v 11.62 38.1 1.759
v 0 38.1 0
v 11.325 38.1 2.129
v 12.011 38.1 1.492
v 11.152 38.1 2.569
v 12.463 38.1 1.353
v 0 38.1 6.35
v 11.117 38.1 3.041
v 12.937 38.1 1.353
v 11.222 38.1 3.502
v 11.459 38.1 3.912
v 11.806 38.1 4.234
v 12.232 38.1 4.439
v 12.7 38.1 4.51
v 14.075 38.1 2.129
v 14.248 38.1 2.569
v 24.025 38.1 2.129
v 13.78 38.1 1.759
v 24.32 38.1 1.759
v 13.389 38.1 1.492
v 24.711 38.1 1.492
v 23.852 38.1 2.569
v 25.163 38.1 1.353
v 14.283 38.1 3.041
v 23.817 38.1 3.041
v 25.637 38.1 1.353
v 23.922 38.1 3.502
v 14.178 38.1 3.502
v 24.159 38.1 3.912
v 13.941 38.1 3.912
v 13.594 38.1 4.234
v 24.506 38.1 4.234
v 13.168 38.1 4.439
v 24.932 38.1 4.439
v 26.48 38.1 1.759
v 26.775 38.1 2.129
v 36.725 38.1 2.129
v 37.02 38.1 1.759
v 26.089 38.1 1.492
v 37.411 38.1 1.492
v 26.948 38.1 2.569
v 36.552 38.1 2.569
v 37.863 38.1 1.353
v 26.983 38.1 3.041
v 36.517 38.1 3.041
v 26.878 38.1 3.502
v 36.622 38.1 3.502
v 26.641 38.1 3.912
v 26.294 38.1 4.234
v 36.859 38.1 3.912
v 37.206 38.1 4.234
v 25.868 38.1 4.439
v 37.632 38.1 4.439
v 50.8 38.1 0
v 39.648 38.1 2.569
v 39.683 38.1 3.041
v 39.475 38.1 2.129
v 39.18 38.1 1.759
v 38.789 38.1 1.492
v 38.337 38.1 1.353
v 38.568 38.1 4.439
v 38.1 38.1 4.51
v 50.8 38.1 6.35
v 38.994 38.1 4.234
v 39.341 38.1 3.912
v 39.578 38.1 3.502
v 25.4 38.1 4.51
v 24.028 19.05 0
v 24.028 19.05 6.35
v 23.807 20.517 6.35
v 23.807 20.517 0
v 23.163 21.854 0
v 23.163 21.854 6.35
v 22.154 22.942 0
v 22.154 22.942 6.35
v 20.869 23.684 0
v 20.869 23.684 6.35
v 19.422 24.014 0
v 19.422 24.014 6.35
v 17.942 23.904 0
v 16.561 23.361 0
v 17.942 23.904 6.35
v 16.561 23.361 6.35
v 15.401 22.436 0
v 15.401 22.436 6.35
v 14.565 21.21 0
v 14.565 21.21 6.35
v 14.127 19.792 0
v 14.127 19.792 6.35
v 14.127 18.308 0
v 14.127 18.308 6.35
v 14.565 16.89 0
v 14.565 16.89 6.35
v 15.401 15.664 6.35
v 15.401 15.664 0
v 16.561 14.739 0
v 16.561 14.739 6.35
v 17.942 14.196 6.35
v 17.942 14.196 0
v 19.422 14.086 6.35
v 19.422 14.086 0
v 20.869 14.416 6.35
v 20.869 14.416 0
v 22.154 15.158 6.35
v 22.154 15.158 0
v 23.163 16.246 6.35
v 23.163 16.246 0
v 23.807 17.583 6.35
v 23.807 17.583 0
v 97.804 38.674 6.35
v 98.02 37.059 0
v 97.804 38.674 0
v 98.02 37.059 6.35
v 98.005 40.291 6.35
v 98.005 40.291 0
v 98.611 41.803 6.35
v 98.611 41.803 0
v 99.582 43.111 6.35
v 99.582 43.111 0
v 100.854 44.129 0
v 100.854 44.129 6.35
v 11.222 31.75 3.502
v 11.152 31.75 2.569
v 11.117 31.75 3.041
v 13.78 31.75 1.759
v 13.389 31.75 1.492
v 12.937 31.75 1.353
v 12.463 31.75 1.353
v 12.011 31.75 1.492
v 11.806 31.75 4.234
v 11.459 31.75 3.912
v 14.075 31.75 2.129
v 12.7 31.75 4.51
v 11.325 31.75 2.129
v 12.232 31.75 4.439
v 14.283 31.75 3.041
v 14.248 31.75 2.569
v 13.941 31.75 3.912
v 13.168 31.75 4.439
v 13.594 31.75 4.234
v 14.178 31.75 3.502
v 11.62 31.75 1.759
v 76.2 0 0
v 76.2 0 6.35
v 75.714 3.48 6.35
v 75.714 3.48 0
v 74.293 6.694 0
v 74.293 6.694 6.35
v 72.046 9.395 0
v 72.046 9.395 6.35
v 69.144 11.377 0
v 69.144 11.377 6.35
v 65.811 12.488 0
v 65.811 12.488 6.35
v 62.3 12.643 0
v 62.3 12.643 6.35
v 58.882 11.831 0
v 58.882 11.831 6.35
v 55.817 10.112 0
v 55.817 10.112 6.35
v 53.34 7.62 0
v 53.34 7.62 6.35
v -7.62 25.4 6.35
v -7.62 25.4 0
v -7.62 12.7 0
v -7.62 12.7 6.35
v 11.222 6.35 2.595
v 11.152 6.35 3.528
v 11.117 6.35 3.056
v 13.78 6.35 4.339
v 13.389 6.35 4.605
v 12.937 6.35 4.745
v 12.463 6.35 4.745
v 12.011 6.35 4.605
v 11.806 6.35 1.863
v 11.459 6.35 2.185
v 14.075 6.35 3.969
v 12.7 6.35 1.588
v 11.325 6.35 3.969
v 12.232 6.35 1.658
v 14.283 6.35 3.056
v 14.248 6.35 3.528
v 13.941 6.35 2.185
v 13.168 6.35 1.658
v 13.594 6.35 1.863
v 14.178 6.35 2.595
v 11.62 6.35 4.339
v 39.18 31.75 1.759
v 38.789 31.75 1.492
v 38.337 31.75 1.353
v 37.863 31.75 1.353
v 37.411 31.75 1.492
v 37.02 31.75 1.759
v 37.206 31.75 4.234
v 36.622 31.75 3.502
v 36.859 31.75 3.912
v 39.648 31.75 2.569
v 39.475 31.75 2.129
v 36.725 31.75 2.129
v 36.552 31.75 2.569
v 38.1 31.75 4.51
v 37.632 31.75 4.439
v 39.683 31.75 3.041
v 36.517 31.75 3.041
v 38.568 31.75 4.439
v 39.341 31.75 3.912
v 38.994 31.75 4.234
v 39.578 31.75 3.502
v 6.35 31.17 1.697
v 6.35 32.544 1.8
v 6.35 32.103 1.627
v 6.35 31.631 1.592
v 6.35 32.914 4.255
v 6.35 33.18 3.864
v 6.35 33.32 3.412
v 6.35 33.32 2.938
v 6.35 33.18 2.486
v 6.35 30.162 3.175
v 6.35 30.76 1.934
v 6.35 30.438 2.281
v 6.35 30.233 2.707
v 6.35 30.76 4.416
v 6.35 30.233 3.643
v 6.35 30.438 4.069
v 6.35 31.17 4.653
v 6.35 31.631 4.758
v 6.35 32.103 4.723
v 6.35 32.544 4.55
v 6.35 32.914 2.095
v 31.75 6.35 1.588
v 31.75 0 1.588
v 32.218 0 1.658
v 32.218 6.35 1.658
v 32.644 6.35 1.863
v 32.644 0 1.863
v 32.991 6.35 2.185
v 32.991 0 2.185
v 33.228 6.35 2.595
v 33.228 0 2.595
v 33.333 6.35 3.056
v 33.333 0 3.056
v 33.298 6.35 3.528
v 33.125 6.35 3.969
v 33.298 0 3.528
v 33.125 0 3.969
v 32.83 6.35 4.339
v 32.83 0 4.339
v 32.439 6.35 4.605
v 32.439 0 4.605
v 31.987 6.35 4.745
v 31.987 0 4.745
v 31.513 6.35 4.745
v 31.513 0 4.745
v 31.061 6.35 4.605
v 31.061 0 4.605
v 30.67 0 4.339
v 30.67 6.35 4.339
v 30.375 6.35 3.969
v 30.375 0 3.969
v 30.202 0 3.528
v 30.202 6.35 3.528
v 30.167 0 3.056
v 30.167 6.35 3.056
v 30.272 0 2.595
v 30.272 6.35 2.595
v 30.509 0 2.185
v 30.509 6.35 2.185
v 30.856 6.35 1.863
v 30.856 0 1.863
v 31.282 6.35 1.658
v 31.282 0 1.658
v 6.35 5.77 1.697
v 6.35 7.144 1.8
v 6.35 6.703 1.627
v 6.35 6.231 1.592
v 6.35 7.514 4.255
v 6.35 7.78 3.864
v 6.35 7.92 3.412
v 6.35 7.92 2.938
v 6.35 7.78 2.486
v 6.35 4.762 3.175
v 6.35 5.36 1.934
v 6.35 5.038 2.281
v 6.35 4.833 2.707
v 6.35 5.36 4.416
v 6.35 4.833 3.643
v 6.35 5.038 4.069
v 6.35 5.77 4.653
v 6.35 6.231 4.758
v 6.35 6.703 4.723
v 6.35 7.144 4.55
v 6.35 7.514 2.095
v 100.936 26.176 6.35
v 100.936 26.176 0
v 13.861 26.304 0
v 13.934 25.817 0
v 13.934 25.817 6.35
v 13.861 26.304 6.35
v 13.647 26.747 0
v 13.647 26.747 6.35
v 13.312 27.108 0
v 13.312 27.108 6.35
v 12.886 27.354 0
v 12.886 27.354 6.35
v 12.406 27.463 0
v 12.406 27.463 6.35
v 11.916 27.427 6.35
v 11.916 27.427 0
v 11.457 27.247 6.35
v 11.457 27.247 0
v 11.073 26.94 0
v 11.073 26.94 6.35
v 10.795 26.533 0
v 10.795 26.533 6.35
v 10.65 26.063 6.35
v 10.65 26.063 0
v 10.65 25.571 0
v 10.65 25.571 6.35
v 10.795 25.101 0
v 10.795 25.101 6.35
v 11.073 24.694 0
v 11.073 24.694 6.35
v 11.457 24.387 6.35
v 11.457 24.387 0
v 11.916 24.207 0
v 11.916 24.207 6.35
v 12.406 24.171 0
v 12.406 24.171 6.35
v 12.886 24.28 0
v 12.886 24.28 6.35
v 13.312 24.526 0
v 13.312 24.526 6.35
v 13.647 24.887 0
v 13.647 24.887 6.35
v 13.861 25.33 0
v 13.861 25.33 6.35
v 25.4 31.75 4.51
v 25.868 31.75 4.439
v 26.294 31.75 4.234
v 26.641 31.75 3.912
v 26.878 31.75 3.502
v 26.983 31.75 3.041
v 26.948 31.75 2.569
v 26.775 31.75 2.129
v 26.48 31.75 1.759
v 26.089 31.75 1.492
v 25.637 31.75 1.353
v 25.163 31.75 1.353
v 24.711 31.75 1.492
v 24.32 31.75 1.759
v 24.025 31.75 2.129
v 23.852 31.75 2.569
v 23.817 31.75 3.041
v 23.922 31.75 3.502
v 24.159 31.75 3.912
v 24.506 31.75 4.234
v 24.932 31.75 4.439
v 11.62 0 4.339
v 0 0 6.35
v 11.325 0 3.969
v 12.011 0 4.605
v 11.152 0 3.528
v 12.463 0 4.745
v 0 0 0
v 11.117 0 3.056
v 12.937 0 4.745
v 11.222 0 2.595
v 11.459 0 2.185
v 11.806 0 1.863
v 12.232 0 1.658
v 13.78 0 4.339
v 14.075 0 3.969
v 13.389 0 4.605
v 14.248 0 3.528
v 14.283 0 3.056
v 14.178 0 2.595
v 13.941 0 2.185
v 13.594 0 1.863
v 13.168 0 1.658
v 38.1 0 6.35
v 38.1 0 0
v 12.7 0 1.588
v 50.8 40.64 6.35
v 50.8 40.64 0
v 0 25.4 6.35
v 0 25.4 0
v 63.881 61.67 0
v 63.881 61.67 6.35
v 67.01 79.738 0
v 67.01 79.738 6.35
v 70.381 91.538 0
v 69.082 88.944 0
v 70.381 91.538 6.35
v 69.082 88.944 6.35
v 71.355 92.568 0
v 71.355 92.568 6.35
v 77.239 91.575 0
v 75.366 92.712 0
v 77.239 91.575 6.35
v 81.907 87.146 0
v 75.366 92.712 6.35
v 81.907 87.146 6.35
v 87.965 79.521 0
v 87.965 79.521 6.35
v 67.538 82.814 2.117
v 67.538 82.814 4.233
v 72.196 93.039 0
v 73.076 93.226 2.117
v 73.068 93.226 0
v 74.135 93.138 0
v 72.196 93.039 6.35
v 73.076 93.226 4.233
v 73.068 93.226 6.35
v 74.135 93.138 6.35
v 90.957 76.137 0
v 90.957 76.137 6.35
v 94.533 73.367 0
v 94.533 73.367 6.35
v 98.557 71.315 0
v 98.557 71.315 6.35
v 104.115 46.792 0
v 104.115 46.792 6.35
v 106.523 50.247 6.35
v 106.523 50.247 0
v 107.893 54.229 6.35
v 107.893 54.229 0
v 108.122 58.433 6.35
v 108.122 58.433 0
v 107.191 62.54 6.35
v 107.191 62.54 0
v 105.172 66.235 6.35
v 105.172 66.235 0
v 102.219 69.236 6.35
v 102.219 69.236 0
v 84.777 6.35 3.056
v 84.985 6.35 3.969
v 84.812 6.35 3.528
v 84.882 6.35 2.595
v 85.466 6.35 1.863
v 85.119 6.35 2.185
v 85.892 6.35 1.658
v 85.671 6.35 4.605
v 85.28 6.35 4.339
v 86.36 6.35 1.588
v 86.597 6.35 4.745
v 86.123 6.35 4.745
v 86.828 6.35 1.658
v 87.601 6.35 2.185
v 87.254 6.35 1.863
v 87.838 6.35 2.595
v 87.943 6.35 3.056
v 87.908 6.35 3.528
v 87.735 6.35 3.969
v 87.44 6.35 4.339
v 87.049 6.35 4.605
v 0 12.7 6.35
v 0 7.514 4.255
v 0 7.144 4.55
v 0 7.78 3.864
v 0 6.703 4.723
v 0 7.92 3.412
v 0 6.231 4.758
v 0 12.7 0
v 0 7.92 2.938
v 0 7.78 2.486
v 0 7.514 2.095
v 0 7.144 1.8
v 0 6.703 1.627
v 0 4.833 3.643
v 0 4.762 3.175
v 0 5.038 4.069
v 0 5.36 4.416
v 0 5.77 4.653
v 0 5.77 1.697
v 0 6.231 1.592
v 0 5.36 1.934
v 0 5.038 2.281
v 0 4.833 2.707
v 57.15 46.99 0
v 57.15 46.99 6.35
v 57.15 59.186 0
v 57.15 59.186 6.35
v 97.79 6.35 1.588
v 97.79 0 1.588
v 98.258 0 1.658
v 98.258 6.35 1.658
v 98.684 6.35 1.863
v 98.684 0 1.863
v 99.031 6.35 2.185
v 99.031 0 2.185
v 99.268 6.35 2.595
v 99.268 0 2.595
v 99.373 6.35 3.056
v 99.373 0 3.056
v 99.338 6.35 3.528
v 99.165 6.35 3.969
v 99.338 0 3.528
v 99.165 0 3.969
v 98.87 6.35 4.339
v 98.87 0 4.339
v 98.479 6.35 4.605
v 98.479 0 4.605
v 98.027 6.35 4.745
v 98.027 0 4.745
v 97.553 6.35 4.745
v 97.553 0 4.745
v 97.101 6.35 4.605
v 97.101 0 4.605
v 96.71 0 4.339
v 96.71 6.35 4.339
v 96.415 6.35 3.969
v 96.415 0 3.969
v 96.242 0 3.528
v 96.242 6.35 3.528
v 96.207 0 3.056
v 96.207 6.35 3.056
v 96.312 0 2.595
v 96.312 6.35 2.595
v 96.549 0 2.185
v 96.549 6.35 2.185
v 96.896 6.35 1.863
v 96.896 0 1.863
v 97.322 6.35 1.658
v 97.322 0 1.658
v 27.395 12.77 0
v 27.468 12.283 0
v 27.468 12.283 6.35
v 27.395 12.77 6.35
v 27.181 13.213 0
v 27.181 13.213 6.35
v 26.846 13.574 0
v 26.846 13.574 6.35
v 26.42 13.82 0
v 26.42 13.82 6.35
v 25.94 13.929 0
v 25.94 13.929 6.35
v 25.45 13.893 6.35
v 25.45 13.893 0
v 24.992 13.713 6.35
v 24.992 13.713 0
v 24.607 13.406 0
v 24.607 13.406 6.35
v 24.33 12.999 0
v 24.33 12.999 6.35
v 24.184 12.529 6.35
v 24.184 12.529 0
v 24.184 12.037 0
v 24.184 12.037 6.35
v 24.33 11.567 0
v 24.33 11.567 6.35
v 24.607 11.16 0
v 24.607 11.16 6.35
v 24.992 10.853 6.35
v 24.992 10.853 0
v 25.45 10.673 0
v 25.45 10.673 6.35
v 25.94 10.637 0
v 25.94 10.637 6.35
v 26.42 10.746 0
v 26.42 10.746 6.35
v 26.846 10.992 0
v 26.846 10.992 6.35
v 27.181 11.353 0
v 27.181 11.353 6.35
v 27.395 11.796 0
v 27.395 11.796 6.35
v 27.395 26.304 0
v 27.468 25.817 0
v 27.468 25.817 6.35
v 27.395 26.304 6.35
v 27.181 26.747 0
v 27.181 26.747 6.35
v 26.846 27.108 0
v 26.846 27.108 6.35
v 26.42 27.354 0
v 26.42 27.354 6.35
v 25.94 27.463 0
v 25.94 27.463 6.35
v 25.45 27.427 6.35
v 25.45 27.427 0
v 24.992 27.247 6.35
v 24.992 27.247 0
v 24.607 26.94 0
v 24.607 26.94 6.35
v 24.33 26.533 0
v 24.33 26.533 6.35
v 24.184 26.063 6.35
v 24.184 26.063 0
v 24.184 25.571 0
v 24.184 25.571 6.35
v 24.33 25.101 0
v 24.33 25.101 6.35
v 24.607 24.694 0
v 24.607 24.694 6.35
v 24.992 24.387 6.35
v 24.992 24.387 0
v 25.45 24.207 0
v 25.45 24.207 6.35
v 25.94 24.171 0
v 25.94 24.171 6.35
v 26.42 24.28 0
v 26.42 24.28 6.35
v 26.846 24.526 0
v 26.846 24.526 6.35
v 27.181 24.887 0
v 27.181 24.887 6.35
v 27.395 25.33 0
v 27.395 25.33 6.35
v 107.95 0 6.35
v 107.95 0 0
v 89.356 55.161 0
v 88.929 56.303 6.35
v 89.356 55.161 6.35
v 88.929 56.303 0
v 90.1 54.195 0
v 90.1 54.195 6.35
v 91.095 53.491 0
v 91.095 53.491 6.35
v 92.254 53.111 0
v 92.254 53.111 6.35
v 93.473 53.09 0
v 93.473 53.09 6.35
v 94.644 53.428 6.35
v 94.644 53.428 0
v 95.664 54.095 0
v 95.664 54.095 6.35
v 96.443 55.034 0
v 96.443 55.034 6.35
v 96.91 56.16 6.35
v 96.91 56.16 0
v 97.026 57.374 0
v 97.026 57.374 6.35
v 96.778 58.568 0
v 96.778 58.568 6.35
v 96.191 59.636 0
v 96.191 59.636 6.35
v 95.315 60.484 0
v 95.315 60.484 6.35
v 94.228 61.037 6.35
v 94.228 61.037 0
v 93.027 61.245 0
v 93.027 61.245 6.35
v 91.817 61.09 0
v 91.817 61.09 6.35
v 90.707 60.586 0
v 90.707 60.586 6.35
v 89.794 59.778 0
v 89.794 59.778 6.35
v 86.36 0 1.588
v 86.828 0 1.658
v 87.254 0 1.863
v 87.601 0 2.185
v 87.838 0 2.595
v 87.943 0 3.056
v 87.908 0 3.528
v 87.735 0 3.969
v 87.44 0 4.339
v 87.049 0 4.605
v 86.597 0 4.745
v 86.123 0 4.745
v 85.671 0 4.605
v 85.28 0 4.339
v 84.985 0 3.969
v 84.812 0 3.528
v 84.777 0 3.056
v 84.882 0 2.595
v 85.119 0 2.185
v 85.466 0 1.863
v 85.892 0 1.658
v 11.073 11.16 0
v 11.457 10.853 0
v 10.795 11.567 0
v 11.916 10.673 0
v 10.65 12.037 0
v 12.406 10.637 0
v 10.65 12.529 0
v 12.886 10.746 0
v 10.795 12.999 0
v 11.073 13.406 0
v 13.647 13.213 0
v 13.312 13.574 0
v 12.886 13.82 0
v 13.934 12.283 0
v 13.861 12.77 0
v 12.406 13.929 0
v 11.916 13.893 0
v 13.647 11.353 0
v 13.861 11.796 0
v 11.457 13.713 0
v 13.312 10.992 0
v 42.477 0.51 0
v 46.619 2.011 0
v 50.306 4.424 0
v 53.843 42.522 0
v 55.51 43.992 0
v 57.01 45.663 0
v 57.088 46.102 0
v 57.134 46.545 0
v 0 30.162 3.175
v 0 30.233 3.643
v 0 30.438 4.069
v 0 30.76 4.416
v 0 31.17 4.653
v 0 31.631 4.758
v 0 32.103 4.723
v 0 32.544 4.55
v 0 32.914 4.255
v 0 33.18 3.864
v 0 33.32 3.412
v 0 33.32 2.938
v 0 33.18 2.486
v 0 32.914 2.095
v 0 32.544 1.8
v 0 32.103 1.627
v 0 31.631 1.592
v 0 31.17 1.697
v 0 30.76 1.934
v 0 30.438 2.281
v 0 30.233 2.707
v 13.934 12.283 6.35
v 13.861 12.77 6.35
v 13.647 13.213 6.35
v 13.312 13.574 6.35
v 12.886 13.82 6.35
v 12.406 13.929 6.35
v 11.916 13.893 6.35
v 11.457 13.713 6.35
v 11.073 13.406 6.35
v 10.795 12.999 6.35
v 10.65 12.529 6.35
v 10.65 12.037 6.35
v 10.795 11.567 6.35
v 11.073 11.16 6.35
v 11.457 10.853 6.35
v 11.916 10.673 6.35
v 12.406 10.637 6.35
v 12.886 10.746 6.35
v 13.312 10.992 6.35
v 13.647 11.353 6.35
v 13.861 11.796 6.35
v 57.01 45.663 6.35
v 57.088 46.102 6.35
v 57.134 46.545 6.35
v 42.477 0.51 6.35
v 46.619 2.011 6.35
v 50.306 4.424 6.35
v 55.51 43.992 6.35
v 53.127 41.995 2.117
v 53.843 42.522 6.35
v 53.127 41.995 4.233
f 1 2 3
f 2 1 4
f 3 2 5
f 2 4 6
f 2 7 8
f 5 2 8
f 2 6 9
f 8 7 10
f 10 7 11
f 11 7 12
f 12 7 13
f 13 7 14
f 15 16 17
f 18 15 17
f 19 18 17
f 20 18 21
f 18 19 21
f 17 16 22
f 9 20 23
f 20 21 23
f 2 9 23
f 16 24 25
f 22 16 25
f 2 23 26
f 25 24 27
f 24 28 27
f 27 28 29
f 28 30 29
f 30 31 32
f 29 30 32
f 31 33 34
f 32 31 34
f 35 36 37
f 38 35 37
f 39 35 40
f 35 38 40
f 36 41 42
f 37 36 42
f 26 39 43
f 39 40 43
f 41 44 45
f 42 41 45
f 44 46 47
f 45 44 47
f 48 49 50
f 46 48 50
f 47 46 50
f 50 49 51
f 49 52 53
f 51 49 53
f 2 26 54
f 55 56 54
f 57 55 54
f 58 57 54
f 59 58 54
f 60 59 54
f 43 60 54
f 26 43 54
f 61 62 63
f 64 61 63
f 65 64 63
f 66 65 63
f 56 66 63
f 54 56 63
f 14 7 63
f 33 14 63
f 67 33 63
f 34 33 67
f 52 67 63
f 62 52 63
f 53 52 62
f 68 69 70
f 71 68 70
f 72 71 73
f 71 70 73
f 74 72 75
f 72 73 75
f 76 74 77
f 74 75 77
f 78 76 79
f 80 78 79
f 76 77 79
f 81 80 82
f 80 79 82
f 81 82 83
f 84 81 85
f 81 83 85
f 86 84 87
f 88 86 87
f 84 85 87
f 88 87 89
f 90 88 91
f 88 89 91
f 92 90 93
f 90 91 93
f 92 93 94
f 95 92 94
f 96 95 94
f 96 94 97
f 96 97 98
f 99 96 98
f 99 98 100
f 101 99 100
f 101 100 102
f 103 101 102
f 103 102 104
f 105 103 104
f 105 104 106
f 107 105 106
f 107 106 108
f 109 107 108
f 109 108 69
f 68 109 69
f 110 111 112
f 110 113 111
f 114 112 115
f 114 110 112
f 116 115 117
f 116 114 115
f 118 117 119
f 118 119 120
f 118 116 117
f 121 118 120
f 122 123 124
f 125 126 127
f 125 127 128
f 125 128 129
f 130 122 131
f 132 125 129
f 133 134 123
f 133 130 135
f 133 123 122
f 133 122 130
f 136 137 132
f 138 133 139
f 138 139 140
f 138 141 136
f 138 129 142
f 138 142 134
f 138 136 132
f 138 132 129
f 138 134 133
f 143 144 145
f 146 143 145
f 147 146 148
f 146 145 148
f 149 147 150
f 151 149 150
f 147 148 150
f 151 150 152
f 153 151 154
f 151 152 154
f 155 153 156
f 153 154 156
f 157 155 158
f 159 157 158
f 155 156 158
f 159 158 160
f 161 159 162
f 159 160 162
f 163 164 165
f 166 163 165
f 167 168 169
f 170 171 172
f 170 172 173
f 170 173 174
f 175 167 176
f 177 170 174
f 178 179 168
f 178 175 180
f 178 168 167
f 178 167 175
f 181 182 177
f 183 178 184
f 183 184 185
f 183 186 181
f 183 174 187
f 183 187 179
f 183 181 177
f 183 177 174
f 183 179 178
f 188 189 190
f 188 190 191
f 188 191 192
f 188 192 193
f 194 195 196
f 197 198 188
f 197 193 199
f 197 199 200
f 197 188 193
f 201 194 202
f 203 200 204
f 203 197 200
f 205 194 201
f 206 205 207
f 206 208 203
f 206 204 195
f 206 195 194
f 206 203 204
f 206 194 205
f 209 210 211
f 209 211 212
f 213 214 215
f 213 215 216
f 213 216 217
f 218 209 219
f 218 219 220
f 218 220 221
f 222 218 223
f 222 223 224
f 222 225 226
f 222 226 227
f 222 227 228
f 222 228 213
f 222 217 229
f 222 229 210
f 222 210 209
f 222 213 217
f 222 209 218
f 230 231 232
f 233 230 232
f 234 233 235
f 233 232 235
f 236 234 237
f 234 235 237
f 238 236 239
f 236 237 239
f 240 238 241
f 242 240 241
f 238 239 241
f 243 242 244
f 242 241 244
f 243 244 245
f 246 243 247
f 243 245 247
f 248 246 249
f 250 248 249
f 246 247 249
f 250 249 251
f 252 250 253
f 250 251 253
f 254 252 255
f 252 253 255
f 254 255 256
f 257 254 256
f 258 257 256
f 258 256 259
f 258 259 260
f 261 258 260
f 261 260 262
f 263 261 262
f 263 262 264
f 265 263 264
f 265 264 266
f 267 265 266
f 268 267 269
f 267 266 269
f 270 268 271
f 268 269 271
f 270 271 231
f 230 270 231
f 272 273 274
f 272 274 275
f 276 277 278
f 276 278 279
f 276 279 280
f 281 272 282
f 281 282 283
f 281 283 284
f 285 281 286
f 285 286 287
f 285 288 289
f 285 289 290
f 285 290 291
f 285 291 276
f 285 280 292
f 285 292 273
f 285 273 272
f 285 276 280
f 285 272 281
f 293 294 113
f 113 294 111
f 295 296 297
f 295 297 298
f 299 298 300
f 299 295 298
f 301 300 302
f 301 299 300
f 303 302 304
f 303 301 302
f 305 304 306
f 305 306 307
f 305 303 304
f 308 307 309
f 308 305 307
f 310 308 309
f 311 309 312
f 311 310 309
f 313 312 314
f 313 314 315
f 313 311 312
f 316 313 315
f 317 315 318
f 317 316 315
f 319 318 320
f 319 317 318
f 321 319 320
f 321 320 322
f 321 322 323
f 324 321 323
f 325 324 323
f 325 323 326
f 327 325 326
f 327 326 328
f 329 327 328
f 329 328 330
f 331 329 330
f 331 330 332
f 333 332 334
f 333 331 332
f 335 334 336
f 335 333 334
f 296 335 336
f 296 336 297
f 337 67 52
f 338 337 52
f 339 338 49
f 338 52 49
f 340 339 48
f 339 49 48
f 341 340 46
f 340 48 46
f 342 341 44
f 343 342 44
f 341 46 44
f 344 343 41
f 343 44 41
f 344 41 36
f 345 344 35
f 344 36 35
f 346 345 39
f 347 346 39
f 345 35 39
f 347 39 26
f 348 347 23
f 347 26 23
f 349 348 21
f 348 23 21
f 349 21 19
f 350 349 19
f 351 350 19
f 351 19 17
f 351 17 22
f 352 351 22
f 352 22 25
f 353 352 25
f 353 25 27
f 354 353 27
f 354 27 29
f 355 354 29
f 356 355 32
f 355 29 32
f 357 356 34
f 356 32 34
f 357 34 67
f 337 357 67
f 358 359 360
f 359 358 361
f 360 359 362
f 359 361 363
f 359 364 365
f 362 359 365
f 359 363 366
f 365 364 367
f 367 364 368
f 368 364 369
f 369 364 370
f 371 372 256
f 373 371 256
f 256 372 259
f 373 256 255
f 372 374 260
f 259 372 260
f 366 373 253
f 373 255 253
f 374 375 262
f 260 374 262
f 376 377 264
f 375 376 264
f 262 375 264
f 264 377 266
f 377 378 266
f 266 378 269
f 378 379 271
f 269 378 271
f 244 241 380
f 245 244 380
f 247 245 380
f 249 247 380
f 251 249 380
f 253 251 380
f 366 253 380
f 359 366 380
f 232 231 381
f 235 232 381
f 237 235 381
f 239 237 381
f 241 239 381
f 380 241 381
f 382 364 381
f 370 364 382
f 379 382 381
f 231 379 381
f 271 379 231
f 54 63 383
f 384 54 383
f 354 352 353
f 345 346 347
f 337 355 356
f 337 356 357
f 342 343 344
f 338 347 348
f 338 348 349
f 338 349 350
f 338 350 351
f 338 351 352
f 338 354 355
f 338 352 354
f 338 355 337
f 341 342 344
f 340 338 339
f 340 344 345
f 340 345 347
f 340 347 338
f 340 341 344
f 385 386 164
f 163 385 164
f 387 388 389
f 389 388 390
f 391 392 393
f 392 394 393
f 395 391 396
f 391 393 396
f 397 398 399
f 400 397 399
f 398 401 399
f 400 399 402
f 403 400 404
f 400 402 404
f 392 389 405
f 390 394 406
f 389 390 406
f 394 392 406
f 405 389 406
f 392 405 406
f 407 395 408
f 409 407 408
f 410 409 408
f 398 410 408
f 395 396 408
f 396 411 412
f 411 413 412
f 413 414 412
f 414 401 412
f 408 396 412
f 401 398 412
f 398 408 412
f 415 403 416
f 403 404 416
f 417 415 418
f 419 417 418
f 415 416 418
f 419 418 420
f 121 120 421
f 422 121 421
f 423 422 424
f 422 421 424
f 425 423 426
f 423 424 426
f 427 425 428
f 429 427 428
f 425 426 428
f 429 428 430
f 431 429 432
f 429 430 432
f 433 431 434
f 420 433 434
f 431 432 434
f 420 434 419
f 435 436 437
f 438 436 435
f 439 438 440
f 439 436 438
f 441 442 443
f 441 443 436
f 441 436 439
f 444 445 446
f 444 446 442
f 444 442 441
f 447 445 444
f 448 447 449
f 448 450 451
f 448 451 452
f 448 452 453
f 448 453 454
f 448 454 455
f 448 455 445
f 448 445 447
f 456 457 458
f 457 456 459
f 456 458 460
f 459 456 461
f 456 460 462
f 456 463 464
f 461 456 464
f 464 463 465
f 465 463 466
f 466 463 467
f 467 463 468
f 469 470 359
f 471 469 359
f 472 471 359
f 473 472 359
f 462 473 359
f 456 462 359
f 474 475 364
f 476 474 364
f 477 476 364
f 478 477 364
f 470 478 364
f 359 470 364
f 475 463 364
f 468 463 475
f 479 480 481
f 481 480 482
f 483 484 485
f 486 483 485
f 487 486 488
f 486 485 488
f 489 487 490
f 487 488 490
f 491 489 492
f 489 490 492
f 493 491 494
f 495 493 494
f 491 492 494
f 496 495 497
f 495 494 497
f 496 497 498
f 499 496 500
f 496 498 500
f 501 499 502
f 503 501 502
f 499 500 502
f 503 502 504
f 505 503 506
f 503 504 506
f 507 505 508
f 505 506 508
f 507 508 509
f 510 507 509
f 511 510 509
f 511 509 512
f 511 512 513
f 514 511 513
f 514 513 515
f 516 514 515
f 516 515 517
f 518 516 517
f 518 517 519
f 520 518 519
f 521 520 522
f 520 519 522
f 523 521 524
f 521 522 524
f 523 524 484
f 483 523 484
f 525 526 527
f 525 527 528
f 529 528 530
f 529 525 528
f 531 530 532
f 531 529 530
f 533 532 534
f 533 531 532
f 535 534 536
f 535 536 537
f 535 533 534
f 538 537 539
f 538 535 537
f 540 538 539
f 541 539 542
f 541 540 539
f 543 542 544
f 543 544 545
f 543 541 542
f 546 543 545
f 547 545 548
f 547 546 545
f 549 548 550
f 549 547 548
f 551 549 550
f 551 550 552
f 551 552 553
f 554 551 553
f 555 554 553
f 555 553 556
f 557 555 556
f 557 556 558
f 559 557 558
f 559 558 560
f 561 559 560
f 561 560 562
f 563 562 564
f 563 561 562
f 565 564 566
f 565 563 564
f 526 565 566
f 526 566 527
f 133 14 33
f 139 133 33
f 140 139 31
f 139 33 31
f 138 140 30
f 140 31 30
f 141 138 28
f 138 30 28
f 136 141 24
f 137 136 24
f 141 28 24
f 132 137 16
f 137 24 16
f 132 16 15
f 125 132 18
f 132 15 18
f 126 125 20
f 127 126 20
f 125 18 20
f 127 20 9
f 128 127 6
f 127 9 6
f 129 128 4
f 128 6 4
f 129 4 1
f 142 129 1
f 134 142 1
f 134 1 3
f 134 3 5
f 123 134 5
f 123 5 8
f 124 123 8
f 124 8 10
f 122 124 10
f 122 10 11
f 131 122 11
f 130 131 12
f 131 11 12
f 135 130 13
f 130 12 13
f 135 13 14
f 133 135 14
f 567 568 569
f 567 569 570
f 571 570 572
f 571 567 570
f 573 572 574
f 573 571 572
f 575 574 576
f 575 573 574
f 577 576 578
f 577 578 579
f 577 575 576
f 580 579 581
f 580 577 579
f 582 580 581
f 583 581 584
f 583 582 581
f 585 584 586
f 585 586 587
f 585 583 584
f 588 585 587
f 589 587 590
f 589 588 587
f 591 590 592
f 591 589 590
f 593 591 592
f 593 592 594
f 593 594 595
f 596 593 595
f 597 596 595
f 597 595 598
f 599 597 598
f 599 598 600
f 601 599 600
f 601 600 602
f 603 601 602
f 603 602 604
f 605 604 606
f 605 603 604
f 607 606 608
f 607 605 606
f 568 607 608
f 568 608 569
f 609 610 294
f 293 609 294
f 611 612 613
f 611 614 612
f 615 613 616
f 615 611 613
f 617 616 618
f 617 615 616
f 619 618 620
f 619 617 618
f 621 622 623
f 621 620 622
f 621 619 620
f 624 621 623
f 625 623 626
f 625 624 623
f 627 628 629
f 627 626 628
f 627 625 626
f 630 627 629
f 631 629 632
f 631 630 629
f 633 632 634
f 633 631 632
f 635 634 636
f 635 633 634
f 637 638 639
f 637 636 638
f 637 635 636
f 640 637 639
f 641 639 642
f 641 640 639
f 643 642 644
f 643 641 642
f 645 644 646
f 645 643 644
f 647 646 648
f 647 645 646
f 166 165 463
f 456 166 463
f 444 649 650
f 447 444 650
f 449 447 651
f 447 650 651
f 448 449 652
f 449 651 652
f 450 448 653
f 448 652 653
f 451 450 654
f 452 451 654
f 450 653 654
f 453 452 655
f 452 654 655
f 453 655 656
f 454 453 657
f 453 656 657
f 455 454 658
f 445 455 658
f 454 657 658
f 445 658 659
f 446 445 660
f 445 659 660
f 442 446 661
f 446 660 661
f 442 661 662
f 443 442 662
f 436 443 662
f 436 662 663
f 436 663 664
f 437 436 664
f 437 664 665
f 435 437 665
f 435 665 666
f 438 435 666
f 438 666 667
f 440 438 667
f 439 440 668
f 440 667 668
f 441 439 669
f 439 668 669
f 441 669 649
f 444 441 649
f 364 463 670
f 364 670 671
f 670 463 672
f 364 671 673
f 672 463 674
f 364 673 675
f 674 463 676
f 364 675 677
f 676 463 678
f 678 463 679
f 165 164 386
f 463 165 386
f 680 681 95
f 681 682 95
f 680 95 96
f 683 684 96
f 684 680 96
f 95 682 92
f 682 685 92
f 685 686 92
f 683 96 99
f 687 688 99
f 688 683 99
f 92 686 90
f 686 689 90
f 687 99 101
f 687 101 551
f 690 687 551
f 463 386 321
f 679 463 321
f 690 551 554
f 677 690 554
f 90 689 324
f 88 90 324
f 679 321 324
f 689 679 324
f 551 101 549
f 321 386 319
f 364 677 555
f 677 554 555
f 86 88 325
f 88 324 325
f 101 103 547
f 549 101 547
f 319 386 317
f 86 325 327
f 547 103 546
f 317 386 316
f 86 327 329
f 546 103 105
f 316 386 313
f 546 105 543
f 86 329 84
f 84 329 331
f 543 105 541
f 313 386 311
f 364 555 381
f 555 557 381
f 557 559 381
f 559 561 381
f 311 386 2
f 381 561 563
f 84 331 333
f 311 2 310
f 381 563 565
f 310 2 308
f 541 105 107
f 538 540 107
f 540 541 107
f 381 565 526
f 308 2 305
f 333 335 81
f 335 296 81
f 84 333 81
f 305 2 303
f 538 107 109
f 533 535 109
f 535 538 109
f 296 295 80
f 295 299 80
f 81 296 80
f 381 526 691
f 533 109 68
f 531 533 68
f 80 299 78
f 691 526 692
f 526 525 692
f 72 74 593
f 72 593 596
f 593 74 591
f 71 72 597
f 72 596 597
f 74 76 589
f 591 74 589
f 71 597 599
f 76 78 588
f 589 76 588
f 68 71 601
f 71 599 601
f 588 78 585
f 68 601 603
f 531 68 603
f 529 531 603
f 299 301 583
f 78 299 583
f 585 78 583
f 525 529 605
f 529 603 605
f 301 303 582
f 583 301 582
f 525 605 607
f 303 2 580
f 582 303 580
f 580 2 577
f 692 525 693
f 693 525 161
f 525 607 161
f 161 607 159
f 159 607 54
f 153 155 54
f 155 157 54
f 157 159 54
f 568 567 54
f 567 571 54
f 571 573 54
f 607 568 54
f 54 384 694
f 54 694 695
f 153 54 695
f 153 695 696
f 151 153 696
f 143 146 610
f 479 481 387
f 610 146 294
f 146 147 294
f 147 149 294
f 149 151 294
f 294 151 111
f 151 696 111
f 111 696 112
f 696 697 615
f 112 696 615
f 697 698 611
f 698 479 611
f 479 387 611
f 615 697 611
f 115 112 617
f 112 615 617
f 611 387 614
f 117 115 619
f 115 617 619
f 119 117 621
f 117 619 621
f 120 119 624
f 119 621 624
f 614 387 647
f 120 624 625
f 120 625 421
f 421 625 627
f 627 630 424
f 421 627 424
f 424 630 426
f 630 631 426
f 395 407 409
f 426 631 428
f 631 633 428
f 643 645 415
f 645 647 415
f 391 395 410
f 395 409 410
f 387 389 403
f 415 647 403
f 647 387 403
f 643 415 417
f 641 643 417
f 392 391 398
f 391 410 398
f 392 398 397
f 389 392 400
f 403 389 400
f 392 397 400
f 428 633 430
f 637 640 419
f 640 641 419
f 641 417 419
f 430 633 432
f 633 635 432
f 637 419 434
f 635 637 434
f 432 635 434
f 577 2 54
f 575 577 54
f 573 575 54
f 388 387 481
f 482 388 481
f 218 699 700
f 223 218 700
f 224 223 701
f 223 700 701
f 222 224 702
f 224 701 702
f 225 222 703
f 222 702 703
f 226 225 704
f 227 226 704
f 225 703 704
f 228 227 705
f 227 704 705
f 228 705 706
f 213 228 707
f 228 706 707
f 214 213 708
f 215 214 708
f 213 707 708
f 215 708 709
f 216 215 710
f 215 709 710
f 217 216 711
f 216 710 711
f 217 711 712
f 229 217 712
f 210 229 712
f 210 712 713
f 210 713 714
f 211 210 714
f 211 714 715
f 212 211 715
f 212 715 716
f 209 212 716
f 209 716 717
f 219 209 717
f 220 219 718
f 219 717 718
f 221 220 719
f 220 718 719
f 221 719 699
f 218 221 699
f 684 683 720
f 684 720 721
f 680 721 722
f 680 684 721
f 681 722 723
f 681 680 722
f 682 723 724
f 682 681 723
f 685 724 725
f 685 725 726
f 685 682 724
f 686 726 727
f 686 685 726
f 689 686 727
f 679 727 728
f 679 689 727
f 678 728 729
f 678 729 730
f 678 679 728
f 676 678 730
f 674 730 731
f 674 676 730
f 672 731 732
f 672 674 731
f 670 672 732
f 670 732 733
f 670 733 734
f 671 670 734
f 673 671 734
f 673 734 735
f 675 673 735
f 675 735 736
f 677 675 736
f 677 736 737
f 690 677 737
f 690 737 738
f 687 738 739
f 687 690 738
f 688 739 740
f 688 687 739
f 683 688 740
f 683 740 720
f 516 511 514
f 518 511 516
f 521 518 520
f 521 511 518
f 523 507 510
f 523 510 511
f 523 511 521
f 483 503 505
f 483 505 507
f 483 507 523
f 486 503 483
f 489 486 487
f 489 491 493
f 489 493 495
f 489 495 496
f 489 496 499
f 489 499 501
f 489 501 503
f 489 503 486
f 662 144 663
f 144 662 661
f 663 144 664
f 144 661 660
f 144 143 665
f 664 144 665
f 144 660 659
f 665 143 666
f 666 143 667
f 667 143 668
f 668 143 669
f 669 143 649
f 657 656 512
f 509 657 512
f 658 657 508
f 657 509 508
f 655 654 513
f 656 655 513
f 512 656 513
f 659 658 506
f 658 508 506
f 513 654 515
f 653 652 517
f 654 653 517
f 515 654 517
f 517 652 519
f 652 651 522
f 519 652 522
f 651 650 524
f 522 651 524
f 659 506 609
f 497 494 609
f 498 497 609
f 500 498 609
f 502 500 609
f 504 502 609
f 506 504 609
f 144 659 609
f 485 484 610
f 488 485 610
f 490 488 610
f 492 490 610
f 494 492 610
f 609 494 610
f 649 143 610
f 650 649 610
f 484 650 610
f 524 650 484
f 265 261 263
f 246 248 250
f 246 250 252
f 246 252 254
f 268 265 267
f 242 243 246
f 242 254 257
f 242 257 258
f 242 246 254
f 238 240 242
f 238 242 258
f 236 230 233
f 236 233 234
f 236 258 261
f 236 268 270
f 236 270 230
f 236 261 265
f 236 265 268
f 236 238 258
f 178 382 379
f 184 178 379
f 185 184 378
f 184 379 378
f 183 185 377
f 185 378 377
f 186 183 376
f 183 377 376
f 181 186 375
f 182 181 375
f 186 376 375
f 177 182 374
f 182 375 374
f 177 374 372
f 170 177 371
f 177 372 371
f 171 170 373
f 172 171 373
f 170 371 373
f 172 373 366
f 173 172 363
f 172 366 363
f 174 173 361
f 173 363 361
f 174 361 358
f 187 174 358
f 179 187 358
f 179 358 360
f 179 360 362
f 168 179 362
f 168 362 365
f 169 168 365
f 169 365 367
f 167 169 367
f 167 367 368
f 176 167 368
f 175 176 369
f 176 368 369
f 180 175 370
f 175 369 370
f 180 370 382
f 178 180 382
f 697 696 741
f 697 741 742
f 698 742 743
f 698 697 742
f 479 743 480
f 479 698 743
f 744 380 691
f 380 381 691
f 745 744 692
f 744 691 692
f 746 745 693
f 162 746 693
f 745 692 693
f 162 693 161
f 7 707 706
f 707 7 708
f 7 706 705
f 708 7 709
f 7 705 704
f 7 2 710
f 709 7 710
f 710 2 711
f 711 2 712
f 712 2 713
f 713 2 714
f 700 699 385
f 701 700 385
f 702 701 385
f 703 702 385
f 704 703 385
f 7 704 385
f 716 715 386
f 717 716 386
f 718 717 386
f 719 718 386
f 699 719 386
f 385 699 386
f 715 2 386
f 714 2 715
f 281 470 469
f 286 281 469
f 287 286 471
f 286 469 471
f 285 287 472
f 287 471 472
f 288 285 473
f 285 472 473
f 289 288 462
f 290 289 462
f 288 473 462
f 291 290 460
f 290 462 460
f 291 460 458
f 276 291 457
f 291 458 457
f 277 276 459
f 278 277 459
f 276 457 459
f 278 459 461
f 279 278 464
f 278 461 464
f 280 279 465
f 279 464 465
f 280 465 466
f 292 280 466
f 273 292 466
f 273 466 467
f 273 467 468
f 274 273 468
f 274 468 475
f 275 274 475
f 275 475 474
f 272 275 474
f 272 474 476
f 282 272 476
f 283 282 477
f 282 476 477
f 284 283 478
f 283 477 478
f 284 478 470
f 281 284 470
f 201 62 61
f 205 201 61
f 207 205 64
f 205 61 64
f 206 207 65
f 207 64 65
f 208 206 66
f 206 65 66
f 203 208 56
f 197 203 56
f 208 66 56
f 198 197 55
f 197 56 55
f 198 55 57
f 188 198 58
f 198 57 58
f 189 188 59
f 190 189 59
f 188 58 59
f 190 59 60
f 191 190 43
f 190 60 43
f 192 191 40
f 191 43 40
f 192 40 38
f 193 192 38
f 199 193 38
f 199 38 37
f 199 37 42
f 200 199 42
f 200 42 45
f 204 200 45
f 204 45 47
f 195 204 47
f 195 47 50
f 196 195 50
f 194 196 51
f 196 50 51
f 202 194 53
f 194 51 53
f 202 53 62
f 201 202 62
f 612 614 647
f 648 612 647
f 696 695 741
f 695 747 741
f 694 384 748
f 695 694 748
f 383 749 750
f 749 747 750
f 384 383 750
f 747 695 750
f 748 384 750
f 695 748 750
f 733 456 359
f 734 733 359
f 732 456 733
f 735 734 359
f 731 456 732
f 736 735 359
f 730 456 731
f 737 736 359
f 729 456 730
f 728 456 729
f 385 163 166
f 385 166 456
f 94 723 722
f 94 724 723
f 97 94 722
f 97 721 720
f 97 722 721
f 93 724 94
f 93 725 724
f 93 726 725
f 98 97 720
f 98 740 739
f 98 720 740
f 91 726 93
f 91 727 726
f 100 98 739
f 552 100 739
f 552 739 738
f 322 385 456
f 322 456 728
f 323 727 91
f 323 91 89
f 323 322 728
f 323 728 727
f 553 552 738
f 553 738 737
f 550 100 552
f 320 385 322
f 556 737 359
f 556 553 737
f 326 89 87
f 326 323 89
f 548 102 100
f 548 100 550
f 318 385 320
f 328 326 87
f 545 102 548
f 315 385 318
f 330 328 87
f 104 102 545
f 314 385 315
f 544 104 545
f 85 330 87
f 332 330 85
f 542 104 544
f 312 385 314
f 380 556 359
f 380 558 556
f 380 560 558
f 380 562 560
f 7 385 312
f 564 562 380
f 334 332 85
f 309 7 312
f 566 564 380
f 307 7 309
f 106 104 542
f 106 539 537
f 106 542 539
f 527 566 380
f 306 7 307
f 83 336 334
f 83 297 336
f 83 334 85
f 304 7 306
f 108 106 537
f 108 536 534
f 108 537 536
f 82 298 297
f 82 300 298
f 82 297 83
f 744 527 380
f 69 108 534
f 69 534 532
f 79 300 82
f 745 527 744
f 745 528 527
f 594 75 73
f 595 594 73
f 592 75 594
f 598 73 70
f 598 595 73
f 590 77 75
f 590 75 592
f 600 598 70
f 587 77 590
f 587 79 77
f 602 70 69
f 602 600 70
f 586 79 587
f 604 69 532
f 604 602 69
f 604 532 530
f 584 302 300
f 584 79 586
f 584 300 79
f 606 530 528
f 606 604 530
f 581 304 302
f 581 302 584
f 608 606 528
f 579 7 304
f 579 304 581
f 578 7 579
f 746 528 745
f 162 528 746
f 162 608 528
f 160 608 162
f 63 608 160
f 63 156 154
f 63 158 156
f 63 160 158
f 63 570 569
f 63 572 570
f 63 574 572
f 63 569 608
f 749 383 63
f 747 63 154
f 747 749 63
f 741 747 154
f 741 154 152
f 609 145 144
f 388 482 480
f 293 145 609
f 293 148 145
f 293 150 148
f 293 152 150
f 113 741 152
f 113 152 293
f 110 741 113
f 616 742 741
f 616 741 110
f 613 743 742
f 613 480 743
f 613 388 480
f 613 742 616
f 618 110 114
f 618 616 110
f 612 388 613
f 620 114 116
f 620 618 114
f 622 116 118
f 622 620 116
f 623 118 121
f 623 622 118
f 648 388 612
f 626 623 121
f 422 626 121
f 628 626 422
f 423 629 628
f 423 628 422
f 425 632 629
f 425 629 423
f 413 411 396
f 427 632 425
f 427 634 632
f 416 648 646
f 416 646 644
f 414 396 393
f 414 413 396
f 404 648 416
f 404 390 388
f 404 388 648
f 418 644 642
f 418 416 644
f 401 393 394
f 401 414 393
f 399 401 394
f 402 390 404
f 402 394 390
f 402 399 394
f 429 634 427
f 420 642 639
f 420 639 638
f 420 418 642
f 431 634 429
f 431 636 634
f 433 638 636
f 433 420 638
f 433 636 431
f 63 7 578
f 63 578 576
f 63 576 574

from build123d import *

# Parameters (mm, degrees)
SKETCH1_R           = 4.09575
SKETCH1_R_2         = 1.651
BOSS_EXTRUDE1_DEPTH = 6.35
SKETCH3_R           = 1.5875
CUT_EXTRUDE1_DEPTH  = 6.35
CUT_EXTRUDE2_DEPTH  = 6.35
SKETCH7_R           = 4.9784
CUT_EXTRUDE3_DEPTH  = 131.317526076
FILLET1_R           = 6.35
SKETCH8_W           = 50.8
SKETCH8_H           = 38.1
CUT_EXTRUDE4_DEPTH  = 50.8
CUT_EXTRUDE5_DEPTH  = 19.304
FILLET6_R           = 6.35
FILLET8_R           = 19.05
SKETCH10_R          = 1.5875
CUT_EXTRUDE6_DEPTH  = 6.35
SKETCH11_R          = 1.5875
CUT_EXTRUDE7_DEPTH  = 6.35
BOSS_EXTRUDE2_DEPTH = 6.35
FILLET9_R           = 24.13


with BuildPart() as part:
    # Sketch1 → Boss-Extrude1 (new body)
    with BuildSketch(Plane.XY):
        with BuildLine():
            Line((0, 0), (107.95, 0))
            Line((107.95, 0), (100.9362606, 26.175631792))
            Line((100.9362606, 26.175631792), (96.600438298, 42.357140917))
            ThreePointArc((96.600438298, 42.357140917), (108.063690957, 58.995863967), (92.935889192, 72.39))
            Line((92.935889192, 72.39), (0, 38.1))
            Line((0, 38.1), (0, 25.4))
            Line((0, 25.4), (-7.62, 25.4))
            Line((-7.62, 25.4), (-7.62, 12.7))
            Line((-7.62, 12.7), (0, 12.7))
            Line((0, 12.7), (0, 0))
        make_face()
        with Locations((92.935889192, 57.15)):
            Circle(SKETCH1_R, mode=Mode.SUBTRACT)
        with Locations((25.817011896, 25.817011896)):
            Circle(SKETCH1_R_2, mode=Mode.SUBTRACT)
        with Locations((25.817011896, 12.282988104)):
            Circle(SKETCH1_R_2, mode=Mode.SUBTRACT)
        with Locations((12.282988104, 12.282988104)):
            Circle(SKETCH1_R_2, mode=Mode.SUBTRACT)
        with Locations((12.282988104, 25.817011896)):
            Circle(SKETCH1_R_2, mode=Mode.SUBTRACT)
    extrude(amount=BOSS_EXTRUDE1_DEPTH)

    # Sketch3 → Cut-Extrude1 (cut)
    with BuildSketch(Plane.ZY):
        with Locations(Location((3.175, 31.75, 0), (0, 0, 270))):
            Circle(SKETCH3_R)
        with Locations(Location((3.175, 6.35, 0), (0, 0, 270))):
            Circle(SKETCH3_R)
    extrude(amount=-CUT_EXTRUDE1_DEPTH, mode=Mode.SUBTRACT)

    # Sketch6 → Cut-Extrude2 (cut)
    with BuildSketch(Plane.XY.offset(6.35)):
        with BuildLine():
            Line((50.8, 0), (76.2, 0))
            ThreePointArc((76.2, 0), (63.5, 12.7), (50.8, 0))
        make_face()
    extrude(amount=-CUT_EXTRUDE2_DEPTH, mode=Mode.SUBTRACT)

    # Sketch7 → Cut-Extrude3 (cut, through all)
    with BuildSketch(Plane.XY.offset(6.35)):
        with Locations((19.05, 19.05)):
            Circle(SKETCH7_R)
    extrude(amount=-CUT_EXTRUDE3_DEPTH, mode=Mode.SUBTRACT)

    # Fillet1
    fillet1_edges = [part.edges().sort_by_distance(p)[0] for p in [
        (96.600438298, 42.357140917, 3.175),
    ]]
    fillet(fillet1_edges, radius=FILLET1_R)

    # Sketch8 → Cut-Extrude4 (cut)
    with BuildSketch(Plane.XY.offset(6.35)):
        with Locations((25.4, 57.15)):
            Rectangle(SKETCH8_W, SKETCH8_H)
    extrude(amount=-CUT_EXTRUDE4_DEPTH, mode=Mode.SUBTRACT)

    # Sketch9 → Cut-Extrude5 (cut)
    with BuildSketch(Plane.XY.offset(6.35)):
        Polygon((50.8, 56.84337261), (50.8, 40.64), (57.15, 40.64), (57.15, 59.186294187), align=None)
    extrude(amount=-CUT_EXTRUDE5_DEPTH, mode=Mode.SUBTRACT)

    # Fillet6
    fillet6_edges = [part.edges().sort_by_distance(p)[0] for p in [
        (57.15, 40.64, 3.175),
    ]]
    fillet(fillet6_edges, radius=FILLET6_R - 0.0001)  # a hair under: the kernel refuses the full size

    # Fillet8
    fillet8_edges = [part.edges().sort_by_distance(p)[0] for p in [
        (50.8, 0, 3.175),
    ]]
    fillet(fillet8_edges, radius=FILLET8_R)

    # Sketch10 → Cut-Extrude6 (cut)
    with BuildSketch(Plane.XZ):
        with Locations(Location((97.79, 3.175, 0), (0, 0, 270))):
            Circle(SKETCH10_R)
        with Locations(Location((86.36, 3.175, 0), (0, 0, 270))):
            Circle(SKETCH10_R)
        with Locations(Location((31.75, 3.175, 0), (0, 0, 270))):
            Circle(SKETCH10_R)
        with Locations(Location((12.7, 3.175, 0), (0, 0, 270))):
            Circle(SKETCH10_R)
    extrude(amount=-CUT_EXTRUDE6_DEPTH, mode=Mode.SUBTRACT)

    # Sketch11 → Cut-Extrude7 (cut)
    with BuildSketch(Plane(origin=(0, 38.1, 0), x_dir=(1, 0, 0), z_dir=(0, 1, 0))):
        with Locations(Location((12.7, -2.922371253, 0), (0, 0, 270))):
            Circle(SKETCH11_R)
        with Locations(Location((25.4, -2.922371253, 0), (0, 0, 270))):
            Circle(SKETCH11_R)
        with Locations(Location((38.1, -2.922371253, 0), (0, 0, 270))):
            Circle(SKETCH11_R)
    extrude(amount=-CUT_EXTRUDE7_DEPTH, mode=Mode.SUBTRACT)

    # Sketch12 → Boss-Extrude2 (add)
    with BuildSketch(Plane.XY.offset(6.35)):
        with BuildLine():
            Line((50.8, 40.64), (85.027112904, 40.64))
            Line((85.027112904, 40.64), (92.935889192, 72.39))
            add(Edge.make_bspline(
                [(50.8, 40.64), (77.240642826, 53.266729026), (54.818289847, 129.190596971), (92.935889192, 72.39)],
                knots=[0, 0, 0, 0, 1, 1, 1, 1], degree=3))
        make_face()
    extrude(amount=-BOSS_EXTRUDE2_DEPTH)

    # Fillet9
    fillet9_edges = [part.edges().sort_by_distance(p)[0] for p in [
        (92.935889192, 72.39, 3.175),
    ]]
    fillet(fillet9_edges, radius=FILLET9_R)


solid = part.part
